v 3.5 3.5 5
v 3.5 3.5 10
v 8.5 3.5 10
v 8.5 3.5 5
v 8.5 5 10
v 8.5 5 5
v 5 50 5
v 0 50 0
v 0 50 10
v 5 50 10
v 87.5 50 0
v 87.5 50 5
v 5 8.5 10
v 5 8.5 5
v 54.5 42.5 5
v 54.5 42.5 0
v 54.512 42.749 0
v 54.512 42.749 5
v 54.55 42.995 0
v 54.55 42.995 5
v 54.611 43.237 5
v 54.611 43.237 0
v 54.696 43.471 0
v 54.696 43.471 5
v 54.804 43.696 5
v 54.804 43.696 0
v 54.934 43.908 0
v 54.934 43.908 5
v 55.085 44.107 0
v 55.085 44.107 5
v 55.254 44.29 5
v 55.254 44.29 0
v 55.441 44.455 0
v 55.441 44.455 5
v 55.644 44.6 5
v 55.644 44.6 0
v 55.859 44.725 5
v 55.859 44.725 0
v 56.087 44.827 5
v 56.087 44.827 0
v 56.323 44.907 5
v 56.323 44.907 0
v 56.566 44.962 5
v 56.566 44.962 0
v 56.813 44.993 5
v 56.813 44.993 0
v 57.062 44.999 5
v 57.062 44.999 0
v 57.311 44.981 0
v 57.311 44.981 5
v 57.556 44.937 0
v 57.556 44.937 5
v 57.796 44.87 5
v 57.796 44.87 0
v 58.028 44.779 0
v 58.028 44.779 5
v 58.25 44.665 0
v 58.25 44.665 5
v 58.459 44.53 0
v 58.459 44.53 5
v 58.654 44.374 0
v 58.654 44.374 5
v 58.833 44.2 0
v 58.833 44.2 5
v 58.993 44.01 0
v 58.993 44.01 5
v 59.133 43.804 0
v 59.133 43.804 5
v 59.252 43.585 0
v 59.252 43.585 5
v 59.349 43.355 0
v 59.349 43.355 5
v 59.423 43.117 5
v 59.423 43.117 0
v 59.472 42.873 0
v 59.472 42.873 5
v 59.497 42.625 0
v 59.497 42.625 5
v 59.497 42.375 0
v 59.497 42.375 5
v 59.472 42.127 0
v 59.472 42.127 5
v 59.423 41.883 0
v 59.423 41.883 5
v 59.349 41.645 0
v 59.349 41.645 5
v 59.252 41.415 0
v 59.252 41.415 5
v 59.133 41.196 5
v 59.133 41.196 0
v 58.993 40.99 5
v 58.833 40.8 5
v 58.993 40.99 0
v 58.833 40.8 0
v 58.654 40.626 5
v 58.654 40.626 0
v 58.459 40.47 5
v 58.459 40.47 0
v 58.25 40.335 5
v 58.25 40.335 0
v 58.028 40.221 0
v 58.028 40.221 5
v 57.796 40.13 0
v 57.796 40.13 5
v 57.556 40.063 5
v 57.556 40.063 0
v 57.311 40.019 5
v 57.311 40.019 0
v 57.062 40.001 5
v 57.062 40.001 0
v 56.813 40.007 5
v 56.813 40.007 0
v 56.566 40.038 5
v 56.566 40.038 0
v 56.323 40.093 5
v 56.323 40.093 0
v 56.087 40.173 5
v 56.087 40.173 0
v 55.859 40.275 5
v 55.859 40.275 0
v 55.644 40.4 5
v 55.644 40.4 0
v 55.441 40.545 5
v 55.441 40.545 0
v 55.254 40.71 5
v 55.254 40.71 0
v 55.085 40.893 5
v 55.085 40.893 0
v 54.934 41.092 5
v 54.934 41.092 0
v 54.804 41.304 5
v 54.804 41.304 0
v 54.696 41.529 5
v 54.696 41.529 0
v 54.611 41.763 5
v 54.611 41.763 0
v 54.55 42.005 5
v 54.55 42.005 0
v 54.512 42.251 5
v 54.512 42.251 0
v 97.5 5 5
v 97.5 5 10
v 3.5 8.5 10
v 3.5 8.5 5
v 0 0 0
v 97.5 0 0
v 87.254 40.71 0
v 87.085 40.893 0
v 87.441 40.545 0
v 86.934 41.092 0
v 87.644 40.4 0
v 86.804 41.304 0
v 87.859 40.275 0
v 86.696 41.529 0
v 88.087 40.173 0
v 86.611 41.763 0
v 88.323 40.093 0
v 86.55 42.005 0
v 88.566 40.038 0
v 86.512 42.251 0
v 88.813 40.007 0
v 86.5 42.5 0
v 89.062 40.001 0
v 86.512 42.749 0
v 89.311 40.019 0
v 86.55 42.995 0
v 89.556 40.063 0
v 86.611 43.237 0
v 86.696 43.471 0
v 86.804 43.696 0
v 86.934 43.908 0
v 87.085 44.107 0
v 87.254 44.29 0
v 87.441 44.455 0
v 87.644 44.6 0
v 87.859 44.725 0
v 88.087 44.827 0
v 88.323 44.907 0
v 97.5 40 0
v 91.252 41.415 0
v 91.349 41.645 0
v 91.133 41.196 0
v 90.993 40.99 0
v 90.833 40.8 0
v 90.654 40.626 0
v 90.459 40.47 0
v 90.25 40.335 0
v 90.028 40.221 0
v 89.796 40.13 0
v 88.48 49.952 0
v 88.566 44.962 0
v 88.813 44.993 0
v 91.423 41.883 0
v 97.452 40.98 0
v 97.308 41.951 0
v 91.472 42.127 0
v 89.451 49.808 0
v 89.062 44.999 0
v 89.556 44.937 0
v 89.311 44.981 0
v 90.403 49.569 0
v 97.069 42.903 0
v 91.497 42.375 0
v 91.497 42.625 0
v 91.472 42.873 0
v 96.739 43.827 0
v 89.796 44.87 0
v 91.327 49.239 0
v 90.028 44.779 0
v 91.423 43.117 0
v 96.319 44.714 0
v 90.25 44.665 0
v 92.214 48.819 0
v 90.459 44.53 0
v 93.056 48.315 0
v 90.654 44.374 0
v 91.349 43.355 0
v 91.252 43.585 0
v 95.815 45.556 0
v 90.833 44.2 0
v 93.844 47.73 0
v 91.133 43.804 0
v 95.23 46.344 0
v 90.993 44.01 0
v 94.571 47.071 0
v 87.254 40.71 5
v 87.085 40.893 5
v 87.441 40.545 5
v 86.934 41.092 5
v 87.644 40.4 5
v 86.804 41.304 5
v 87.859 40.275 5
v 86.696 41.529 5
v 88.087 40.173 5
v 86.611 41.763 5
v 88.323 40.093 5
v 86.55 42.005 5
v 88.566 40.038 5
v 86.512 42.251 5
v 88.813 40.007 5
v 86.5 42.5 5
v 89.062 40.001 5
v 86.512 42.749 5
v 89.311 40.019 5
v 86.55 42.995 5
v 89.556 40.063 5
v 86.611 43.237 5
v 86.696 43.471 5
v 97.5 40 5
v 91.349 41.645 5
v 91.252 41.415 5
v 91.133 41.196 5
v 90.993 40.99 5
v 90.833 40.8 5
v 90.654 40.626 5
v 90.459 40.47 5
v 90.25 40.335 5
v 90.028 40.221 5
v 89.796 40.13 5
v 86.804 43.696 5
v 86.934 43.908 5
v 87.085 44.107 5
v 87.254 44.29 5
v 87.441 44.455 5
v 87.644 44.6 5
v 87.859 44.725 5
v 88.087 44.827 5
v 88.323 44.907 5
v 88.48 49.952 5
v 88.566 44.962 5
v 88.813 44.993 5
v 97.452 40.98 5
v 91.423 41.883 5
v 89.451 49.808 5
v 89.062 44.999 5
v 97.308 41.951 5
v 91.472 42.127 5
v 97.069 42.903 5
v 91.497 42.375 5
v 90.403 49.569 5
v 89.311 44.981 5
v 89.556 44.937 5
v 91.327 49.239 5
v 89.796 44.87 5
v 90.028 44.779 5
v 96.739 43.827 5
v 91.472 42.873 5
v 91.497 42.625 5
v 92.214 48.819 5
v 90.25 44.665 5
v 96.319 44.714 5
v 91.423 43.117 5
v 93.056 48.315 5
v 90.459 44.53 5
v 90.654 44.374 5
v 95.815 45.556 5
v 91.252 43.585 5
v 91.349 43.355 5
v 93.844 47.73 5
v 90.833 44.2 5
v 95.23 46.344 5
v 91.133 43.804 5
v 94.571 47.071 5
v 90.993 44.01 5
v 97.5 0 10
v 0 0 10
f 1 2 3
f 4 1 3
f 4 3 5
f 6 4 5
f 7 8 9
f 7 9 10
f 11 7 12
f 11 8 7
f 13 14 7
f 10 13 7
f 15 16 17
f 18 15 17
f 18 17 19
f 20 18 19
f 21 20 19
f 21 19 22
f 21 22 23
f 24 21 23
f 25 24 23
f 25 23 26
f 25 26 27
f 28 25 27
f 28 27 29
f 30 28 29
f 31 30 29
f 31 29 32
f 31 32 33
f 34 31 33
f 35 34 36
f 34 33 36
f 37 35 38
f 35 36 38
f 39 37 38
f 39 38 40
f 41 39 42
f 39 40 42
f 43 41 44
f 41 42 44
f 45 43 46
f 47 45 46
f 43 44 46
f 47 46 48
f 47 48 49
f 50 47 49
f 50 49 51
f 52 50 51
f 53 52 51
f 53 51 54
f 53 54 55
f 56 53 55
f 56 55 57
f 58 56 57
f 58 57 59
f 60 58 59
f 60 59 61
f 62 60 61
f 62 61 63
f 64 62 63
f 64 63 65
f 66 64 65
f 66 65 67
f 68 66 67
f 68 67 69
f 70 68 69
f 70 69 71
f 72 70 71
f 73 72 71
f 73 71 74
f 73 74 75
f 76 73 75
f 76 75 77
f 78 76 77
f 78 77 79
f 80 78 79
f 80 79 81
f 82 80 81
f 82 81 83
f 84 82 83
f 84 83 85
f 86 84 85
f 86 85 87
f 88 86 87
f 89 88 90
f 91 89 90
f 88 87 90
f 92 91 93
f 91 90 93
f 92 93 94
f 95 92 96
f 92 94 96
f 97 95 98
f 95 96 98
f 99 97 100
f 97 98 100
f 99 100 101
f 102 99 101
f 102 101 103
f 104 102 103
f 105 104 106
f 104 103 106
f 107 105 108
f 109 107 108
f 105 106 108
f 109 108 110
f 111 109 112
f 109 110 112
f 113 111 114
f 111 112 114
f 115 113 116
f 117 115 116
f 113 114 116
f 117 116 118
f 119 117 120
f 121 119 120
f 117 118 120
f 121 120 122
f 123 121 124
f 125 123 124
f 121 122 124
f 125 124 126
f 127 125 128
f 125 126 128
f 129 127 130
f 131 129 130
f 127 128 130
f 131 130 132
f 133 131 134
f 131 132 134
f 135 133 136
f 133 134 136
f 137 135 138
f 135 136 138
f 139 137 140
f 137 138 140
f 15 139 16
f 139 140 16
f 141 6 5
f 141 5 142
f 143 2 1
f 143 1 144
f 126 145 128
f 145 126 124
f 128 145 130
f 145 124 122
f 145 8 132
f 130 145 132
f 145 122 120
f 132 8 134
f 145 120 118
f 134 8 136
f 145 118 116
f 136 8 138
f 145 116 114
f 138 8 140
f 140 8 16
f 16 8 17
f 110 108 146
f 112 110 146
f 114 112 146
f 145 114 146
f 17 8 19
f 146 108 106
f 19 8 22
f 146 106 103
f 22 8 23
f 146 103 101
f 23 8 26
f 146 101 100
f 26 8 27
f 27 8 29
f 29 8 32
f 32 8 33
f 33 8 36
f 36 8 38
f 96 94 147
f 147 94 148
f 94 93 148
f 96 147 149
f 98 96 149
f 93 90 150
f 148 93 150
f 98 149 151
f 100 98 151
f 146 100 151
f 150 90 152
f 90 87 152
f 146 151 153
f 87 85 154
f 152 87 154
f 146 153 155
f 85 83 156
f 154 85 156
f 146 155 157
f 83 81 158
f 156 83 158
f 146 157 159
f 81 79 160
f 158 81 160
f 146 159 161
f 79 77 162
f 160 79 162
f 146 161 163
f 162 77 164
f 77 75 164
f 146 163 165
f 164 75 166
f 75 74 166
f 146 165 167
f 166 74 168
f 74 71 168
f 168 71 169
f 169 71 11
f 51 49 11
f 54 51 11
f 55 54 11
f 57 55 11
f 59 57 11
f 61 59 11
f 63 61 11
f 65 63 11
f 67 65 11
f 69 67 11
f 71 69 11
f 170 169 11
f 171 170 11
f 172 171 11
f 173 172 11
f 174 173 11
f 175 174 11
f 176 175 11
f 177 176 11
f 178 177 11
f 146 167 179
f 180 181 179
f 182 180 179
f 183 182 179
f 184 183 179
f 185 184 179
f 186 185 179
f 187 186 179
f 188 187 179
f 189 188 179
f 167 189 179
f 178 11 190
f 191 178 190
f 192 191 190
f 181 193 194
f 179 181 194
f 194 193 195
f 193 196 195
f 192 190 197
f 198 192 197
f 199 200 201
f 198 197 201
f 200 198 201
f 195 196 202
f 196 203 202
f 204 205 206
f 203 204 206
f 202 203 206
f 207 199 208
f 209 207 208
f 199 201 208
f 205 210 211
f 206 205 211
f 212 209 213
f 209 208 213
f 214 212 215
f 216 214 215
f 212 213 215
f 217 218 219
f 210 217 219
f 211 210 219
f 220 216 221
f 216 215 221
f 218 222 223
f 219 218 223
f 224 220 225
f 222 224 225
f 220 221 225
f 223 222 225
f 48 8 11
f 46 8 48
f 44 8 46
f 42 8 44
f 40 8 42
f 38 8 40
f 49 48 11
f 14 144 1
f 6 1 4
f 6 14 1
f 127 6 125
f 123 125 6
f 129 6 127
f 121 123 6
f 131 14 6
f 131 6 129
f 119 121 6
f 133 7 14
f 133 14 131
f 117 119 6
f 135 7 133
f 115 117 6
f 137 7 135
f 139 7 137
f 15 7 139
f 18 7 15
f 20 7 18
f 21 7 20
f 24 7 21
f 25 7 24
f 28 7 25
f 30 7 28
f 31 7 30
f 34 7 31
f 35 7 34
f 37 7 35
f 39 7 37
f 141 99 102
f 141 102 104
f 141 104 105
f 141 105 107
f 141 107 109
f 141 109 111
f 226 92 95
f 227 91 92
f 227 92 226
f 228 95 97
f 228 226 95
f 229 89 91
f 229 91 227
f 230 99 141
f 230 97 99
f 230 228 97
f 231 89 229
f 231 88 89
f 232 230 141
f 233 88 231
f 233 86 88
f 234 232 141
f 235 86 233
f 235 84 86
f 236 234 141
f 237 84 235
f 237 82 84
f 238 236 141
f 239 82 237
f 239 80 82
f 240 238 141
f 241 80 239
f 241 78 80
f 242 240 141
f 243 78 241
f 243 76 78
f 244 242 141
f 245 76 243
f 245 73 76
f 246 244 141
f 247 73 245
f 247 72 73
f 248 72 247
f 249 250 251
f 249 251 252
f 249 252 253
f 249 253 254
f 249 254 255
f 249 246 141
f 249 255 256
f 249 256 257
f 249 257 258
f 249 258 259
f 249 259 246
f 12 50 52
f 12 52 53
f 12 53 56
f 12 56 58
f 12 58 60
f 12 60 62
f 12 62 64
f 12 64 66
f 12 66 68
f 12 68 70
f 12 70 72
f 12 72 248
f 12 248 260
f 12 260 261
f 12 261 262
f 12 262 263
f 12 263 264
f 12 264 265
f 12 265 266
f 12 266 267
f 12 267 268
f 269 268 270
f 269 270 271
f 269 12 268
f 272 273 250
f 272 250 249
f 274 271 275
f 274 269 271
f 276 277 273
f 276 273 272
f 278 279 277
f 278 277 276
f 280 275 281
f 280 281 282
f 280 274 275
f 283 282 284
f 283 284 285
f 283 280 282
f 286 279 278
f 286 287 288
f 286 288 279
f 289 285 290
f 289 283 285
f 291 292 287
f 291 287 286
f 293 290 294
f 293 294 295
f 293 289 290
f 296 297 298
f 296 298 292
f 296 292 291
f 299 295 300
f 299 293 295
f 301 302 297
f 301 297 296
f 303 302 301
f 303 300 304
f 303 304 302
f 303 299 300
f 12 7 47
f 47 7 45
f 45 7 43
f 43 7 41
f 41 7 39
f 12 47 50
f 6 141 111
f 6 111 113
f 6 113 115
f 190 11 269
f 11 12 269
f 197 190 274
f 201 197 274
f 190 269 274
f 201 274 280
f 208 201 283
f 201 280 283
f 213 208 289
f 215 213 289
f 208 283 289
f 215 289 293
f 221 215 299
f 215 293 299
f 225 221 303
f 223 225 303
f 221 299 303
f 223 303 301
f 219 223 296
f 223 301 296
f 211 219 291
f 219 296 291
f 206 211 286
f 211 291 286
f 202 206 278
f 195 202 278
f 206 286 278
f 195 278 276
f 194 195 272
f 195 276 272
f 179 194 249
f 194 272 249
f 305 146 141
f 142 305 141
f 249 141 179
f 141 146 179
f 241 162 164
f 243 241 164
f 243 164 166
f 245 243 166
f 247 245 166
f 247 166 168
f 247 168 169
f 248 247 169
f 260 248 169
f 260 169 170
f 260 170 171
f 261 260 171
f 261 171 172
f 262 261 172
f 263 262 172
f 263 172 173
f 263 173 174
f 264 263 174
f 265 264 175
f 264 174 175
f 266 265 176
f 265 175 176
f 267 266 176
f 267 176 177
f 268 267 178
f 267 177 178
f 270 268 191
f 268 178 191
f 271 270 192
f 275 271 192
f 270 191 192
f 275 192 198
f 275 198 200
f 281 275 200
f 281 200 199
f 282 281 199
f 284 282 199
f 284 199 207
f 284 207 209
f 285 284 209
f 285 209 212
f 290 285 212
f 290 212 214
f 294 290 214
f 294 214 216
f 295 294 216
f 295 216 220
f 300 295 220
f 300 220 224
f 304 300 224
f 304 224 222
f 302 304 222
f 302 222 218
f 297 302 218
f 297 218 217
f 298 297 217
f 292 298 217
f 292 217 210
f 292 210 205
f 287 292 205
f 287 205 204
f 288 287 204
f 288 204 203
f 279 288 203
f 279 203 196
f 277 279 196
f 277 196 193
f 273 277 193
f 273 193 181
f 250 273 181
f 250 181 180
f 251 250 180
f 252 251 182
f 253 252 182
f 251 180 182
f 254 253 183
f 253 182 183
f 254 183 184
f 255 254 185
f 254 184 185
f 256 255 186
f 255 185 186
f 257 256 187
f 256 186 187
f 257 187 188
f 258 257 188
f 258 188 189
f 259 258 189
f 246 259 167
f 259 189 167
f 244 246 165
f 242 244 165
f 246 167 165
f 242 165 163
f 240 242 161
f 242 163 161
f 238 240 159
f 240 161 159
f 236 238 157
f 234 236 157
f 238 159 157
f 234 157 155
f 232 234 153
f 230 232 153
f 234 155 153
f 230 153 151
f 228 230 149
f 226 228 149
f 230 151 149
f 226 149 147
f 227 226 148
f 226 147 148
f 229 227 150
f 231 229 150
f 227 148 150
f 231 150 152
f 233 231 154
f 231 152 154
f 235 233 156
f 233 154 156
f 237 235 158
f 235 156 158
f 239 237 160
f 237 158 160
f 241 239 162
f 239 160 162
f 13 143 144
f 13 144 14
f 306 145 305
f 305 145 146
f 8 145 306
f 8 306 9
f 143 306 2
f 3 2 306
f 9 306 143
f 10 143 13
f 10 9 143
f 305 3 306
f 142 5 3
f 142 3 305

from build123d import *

# Parameters (mm, degrees)
F0_W     = 97.5
F0_H     = 50
F1_DEPTH = 10
F2_T     = -5
F3_W     = 5
F3_H     = 5
F4_DEPTH = 5
F6_D     = 5
F7_R     = 10


with BuildPart() as f1:
    # F0 (on Top) → F1 (new body)
    with BuildSketch(Plane.XY):
        with Locations((48.75, 25)):
            Rectangle(F0_W, F0_H)
    extrude(amount=F1_DEPTH)

    # F2
    f2_openings = [f1.faces().sort_by_distance(p)[0] for p in [
        (97.5, 25, 5),
        (48.75, 50, 5),
        (48.75, 25, 10),
    ]]
    offset(amount=F2_T, openings=f2_openings)

    # F3 (on face) → F4 (cut)
    with BuildSketch(Plane.XY.offset(10)):
        with Locations((6, 6)):
            Rectangle(F3_W, F3_H)
    extrude(amount=-F4_DEPTH, mode=Mode.SUBTRACT)

    # F6 (through all)
    with Locations(Plane.XY.offset(5)):
        with Locations((57, 42.5), (89, 42.5)):
            Hole(F6_D / 2)

    # F7
    f7_edges = [f1.edges().sort_by_distance(p)[0] for p in [
        (97.5, 50, 2.5),
    ]]
    fillet(f7_edges, radius=F7_R)


solid = f1.part
